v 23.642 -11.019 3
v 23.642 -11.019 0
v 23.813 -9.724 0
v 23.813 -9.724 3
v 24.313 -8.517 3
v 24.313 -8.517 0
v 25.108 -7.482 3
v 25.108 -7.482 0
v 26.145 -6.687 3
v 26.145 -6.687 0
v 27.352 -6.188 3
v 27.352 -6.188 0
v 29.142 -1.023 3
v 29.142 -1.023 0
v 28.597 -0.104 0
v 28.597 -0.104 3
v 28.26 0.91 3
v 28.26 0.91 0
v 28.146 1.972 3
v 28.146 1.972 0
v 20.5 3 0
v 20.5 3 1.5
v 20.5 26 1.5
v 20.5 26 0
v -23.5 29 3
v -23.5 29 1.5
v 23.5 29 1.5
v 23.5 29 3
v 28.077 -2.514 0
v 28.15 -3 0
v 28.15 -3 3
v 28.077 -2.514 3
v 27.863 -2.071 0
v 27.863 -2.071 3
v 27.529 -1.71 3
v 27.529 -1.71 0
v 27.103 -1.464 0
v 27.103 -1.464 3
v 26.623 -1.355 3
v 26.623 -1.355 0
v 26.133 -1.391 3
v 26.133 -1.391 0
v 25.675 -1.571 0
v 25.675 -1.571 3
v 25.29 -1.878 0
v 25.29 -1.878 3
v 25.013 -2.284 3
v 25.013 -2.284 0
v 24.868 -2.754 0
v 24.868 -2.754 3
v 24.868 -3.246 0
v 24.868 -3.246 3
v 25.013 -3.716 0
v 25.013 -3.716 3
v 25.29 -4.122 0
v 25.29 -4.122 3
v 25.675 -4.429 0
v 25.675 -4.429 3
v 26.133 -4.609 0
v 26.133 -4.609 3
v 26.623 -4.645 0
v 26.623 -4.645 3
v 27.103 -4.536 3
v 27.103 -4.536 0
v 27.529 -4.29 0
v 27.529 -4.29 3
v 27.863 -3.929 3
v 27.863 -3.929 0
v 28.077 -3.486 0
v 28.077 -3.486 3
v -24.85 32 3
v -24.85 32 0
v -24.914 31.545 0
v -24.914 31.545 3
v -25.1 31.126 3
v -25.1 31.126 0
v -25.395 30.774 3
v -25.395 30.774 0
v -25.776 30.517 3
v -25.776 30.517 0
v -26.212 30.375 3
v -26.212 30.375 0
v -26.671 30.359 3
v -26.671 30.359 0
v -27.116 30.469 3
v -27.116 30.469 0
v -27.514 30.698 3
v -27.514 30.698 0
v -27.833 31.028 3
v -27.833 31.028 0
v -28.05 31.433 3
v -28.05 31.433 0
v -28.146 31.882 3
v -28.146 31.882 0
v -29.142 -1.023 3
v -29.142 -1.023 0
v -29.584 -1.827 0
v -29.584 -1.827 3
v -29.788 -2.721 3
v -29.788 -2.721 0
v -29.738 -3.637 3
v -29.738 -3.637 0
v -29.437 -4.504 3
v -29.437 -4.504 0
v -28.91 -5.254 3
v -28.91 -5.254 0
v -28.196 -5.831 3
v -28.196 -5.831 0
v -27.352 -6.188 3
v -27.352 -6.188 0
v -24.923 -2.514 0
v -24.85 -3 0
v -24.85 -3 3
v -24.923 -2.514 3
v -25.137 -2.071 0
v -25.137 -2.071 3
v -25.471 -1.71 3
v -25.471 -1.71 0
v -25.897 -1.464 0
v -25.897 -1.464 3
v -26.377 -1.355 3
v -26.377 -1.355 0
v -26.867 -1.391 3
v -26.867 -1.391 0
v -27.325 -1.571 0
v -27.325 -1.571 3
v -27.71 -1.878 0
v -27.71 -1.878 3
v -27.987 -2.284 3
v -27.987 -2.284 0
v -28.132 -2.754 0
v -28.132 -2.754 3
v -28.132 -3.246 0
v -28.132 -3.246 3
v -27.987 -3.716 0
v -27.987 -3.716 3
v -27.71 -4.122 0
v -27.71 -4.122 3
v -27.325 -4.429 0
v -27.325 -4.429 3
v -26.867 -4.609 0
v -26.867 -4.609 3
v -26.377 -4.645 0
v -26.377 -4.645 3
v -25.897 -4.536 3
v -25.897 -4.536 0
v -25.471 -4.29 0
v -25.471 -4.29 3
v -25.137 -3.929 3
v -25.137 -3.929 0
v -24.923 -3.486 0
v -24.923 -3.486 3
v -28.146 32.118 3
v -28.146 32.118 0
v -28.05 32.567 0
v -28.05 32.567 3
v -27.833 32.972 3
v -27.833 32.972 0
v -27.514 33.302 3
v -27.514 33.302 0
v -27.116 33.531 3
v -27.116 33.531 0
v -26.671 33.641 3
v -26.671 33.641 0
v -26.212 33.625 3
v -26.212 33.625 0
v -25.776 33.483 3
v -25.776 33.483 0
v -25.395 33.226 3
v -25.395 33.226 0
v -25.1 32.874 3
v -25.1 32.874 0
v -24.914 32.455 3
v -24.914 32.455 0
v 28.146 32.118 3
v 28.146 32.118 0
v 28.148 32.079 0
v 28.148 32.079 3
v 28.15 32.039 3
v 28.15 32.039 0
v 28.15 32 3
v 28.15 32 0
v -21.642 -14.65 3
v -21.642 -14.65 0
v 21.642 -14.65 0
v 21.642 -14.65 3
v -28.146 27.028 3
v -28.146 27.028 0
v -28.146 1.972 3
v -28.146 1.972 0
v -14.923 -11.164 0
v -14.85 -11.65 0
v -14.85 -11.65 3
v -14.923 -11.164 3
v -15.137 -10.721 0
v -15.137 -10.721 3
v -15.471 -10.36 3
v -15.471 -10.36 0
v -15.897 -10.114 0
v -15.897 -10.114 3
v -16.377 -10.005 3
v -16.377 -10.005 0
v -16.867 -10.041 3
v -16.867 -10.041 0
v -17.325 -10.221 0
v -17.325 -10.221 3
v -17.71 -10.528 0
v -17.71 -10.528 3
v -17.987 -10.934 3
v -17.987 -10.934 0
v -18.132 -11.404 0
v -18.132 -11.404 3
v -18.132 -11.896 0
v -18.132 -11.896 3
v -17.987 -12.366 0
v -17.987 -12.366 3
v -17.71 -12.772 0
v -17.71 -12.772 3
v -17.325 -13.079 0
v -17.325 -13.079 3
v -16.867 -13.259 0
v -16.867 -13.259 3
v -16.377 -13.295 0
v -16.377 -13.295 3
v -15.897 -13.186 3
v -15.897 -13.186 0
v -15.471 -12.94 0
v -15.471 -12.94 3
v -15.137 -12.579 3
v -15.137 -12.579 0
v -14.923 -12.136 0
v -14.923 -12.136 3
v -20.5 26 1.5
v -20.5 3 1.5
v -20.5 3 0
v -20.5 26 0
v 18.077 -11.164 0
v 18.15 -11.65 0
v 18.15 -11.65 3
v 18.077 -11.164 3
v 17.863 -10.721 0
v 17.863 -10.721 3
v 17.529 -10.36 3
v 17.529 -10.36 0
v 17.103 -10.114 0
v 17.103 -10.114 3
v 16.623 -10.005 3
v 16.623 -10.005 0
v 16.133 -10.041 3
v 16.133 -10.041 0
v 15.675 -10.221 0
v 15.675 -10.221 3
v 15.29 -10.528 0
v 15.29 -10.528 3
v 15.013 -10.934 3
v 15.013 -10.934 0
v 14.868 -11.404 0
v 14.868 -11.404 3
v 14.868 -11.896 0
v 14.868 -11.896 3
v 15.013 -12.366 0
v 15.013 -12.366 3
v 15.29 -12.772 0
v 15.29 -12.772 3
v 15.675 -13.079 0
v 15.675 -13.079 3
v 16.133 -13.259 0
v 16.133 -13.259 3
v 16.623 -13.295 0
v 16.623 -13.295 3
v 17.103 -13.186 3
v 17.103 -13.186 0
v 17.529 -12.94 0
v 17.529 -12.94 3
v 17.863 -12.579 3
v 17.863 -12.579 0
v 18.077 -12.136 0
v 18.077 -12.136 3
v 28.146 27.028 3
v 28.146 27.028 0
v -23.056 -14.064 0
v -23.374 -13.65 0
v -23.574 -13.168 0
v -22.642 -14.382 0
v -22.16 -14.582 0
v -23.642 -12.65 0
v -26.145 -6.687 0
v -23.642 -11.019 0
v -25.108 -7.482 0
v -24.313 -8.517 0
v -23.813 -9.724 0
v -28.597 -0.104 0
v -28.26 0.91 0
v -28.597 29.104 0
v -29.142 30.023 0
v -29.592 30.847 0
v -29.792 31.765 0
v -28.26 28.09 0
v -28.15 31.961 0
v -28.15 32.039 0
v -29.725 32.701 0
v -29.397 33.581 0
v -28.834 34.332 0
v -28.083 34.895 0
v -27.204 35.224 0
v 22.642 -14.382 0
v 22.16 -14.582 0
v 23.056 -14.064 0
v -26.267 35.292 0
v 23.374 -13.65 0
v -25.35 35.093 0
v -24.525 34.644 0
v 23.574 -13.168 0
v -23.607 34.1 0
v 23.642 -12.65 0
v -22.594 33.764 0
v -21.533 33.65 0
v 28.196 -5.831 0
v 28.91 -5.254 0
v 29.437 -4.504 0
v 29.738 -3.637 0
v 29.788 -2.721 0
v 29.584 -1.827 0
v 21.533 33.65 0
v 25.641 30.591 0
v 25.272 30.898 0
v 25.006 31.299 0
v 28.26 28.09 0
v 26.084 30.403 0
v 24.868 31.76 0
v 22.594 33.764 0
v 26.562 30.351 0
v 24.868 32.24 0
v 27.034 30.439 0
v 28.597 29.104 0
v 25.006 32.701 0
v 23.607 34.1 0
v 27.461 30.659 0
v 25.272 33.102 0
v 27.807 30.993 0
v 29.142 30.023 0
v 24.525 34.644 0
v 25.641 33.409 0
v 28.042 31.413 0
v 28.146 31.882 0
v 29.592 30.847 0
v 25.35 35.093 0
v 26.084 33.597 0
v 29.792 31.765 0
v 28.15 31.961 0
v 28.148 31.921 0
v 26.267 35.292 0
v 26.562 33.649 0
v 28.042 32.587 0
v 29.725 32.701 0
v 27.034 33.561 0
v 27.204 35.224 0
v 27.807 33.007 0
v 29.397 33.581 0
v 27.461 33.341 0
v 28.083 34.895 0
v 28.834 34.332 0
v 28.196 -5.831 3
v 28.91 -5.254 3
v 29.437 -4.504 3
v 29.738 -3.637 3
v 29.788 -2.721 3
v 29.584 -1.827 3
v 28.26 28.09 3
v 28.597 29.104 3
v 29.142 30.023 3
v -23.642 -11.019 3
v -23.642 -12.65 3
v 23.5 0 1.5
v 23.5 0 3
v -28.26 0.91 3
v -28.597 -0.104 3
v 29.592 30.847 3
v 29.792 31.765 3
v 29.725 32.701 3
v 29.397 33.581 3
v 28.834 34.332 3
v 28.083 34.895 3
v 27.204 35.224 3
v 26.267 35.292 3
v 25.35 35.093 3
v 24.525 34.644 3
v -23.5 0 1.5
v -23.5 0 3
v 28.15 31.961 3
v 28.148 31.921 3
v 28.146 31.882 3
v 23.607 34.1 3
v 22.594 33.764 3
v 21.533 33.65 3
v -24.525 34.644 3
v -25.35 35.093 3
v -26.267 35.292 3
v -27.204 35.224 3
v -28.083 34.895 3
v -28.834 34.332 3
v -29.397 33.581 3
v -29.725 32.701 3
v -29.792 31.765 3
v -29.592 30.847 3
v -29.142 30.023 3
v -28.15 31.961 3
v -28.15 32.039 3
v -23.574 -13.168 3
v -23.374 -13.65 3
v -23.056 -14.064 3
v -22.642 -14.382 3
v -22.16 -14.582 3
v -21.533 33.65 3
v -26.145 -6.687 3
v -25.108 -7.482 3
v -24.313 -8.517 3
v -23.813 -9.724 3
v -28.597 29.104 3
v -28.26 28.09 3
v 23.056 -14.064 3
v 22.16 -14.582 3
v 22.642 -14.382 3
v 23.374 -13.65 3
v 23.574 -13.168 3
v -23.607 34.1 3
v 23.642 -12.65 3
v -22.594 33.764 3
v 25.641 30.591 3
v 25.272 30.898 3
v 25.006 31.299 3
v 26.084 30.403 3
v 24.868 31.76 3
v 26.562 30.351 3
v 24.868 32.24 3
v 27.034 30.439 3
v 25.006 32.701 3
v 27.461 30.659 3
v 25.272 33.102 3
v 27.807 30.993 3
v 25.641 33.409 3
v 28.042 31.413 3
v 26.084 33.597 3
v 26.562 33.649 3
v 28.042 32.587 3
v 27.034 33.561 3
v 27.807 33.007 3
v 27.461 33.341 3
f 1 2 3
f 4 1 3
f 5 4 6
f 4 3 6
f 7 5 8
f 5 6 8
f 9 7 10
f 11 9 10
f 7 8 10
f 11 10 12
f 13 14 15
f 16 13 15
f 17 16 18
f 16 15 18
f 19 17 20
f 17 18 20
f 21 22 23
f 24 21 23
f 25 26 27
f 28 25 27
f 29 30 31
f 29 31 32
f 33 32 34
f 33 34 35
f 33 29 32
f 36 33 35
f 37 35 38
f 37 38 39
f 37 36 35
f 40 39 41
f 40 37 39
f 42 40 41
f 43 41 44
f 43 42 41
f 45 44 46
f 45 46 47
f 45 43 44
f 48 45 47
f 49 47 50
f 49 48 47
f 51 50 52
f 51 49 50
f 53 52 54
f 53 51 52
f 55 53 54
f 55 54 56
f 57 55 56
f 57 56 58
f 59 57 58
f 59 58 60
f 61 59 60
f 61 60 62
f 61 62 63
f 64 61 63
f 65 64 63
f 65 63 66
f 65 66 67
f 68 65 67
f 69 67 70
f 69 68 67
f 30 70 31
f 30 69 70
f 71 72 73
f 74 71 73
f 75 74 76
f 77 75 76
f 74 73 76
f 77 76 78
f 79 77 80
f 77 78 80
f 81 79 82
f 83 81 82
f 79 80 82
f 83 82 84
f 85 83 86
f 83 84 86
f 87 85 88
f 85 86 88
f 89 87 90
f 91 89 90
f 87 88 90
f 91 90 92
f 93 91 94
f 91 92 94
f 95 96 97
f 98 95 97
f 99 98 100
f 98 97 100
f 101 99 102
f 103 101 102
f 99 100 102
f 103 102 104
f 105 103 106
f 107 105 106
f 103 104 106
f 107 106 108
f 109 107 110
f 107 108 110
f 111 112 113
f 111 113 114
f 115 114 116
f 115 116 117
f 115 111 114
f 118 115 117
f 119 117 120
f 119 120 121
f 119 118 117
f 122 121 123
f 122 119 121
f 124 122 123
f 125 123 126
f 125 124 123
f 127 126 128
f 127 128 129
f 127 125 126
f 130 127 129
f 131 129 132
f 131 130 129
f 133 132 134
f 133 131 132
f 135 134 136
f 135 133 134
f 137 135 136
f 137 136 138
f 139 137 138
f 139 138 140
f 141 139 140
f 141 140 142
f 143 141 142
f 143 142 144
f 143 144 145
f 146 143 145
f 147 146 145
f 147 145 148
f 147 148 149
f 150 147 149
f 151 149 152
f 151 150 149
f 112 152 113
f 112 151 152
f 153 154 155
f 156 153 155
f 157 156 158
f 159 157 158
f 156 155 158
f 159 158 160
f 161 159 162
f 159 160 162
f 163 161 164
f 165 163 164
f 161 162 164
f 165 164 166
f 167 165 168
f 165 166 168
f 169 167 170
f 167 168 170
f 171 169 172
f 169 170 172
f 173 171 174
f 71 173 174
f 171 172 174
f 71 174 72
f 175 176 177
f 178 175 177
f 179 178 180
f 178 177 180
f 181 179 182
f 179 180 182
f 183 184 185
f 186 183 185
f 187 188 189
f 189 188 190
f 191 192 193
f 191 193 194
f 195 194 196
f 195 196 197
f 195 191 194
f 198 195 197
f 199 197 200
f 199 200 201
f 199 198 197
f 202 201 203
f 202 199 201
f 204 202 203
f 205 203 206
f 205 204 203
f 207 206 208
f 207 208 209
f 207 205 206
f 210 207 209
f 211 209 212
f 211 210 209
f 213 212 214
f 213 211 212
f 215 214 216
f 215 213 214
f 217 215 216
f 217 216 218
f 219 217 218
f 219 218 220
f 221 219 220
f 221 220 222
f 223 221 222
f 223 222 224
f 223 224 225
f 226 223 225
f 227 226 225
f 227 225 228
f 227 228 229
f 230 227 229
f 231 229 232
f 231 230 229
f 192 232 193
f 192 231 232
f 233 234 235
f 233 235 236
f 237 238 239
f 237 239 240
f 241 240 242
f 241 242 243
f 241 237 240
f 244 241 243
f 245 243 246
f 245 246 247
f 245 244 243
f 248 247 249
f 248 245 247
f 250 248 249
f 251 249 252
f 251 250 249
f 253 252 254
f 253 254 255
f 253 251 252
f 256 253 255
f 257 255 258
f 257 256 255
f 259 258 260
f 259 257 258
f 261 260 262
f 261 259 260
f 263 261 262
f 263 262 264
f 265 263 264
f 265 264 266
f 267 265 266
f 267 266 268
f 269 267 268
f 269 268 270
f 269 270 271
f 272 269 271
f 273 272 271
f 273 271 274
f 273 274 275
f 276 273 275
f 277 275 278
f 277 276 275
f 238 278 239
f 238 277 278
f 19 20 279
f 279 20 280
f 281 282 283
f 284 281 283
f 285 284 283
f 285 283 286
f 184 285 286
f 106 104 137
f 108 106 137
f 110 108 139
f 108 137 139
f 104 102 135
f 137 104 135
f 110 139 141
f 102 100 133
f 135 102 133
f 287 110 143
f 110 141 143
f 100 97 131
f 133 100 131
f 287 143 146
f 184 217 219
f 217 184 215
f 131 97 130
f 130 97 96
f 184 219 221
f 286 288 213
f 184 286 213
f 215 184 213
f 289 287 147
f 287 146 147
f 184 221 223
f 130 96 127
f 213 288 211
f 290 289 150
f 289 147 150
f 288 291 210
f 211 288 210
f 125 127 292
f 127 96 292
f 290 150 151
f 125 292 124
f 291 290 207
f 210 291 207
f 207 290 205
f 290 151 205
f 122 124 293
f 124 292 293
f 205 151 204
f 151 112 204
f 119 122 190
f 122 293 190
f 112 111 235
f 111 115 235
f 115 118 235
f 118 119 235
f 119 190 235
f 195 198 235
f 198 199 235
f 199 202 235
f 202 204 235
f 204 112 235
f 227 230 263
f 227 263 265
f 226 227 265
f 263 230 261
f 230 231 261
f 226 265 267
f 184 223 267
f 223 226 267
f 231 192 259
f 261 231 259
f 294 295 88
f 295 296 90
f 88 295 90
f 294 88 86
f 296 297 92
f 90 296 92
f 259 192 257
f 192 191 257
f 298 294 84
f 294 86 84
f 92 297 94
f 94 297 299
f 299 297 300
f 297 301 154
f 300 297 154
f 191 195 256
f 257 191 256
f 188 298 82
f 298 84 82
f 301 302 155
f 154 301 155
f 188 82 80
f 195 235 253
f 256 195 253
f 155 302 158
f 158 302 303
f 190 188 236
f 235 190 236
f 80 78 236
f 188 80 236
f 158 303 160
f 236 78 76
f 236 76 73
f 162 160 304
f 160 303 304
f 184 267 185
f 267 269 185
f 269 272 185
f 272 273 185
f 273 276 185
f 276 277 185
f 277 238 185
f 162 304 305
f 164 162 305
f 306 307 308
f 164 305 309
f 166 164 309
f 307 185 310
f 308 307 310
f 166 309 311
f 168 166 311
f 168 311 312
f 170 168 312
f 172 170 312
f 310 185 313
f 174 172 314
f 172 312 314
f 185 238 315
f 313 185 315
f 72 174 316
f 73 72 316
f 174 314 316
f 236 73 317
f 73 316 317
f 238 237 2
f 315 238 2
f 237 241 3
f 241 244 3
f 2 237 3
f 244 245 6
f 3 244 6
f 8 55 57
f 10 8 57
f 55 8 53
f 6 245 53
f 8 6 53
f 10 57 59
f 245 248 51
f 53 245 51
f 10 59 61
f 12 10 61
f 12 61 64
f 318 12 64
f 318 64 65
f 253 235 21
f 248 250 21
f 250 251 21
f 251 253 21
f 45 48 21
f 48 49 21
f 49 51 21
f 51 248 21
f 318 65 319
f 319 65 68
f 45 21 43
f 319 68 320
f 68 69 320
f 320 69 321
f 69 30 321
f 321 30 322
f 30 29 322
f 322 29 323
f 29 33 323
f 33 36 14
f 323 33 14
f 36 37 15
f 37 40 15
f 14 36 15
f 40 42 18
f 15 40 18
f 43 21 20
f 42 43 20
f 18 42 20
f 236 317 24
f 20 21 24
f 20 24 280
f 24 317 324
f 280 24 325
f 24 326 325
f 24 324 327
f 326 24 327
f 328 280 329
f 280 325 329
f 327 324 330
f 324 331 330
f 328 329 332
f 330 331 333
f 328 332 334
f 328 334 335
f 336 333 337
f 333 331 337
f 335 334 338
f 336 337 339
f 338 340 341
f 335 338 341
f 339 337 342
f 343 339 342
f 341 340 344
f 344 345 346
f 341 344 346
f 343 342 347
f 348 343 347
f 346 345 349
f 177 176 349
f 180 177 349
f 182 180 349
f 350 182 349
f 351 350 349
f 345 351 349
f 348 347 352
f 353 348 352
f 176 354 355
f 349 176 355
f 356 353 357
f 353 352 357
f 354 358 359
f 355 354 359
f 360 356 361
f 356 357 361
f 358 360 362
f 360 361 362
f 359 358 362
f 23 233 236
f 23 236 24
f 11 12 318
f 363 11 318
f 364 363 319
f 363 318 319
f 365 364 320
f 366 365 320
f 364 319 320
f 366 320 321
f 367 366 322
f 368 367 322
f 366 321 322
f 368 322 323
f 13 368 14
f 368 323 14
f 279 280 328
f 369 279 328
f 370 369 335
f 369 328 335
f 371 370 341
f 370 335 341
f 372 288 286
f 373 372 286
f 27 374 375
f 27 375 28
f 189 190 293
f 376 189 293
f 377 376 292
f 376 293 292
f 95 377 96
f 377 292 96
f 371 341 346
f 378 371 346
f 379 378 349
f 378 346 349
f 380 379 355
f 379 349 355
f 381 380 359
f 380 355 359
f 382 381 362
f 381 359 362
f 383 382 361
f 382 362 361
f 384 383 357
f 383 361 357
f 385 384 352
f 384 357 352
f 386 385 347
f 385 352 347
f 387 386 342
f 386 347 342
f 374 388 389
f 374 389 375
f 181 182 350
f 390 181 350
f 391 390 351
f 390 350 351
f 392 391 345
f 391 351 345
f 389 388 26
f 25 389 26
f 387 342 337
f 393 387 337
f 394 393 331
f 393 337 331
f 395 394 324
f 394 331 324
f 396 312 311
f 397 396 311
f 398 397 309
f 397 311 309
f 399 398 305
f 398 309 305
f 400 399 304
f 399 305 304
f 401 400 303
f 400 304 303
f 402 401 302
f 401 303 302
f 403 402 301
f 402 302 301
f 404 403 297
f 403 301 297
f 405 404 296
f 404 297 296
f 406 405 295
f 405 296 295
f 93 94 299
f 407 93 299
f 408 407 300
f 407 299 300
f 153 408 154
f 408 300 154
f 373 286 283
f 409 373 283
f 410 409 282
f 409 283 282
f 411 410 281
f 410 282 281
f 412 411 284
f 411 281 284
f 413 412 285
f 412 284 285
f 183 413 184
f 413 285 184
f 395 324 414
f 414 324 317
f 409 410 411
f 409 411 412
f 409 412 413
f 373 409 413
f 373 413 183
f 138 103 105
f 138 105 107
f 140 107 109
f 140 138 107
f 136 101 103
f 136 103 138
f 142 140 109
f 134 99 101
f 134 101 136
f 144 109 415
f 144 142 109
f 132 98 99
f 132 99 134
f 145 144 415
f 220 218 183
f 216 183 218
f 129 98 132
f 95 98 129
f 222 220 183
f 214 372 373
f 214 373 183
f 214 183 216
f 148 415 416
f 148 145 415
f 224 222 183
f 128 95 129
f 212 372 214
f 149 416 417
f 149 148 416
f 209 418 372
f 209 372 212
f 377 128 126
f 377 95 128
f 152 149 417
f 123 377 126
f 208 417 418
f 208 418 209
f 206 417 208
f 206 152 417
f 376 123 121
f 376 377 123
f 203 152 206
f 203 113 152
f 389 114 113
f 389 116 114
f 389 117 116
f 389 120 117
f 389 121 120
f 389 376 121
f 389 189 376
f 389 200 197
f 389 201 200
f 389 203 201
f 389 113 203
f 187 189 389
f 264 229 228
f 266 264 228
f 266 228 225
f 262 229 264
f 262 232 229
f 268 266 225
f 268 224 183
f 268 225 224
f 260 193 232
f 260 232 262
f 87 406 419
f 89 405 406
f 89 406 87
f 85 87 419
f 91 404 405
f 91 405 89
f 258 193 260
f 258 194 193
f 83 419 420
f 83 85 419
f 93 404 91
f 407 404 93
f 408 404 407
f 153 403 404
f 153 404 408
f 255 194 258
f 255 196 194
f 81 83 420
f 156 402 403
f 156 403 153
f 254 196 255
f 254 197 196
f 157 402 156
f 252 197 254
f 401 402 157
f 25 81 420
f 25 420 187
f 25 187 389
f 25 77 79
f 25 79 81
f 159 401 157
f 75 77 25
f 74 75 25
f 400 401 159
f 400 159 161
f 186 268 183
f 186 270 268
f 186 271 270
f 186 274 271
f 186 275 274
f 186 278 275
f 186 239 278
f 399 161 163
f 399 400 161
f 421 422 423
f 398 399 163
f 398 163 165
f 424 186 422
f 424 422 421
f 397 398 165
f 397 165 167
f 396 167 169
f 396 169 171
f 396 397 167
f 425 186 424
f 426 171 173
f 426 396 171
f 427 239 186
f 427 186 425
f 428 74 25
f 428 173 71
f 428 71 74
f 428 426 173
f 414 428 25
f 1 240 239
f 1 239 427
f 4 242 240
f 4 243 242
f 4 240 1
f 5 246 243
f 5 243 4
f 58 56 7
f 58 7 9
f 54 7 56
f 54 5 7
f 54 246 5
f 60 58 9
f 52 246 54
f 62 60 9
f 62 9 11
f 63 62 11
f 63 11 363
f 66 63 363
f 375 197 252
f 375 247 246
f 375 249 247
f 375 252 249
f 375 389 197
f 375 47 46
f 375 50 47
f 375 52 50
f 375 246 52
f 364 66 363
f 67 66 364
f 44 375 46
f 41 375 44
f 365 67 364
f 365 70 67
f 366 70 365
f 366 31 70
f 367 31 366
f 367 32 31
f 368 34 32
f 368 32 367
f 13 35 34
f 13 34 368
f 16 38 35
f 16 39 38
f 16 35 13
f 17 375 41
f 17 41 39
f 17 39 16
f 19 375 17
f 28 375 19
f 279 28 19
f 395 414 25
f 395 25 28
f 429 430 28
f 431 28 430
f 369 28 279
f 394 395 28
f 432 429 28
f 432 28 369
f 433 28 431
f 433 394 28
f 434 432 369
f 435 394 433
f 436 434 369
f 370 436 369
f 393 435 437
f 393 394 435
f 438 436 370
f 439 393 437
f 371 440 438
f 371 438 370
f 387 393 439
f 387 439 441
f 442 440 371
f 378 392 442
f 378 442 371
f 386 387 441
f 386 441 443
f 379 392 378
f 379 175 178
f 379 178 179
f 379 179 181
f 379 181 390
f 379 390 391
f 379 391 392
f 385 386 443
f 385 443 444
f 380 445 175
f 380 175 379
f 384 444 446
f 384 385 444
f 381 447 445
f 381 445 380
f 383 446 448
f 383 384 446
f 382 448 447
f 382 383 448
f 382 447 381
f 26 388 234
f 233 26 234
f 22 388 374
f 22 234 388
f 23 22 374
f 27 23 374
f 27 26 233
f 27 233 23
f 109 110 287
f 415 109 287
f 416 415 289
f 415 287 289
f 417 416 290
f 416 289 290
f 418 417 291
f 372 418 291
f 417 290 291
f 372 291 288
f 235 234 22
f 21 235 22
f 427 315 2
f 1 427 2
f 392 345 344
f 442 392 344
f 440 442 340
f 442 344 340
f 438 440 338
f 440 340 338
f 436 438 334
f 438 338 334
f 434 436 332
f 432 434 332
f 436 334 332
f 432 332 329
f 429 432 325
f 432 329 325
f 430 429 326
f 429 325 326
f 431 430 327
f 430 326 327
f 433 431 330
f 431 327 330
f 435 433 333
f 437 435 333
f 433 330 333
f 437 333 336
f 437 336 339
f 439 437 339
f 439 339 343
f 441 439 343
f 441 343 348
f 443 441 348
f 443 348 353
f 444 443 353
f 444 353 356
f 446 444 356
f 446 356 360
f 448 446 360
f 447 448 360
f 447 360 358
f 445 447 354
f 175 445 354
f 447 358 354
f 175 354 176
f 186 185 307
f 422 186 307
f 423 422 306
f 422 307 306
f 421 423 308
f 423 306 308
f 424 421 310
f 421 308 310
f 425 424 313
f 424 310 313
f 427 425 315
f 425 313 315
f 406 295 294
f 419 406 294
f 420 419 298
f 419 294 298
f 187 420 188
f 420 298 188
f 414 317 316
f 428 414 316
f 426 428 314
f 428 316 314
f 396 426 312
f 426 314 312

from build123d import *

# Parameters (mm, degrees)
F0_W          = 47
F0_H          = 29
F1_DEPTH      = 1.5
F0_R          = 1.65
F2_DEPTH      = 3
F3_W          = 41
F3_H          = 23
F4_DEPTH      = 1.5
F4_DEPTH_BACK = 25


with BuildPart() as f1:
    # F0 (on Top) → F1 (new body)
    with BuildSketch(Plane.XY):
        with Locations((0, 14.5)):
            Rectangle(F0_W, F0_H)
    extrude(amount=F1_DEPTH)

    # F0 (on Top) → F2 (join)
    with BuildSketch(Plane.XY):
        with BuildLine():
            ThreePointArc((-21.533361, 33.65), (-23.10973, 33.904996), (-24.525312, 34.643976))
            ThreePointArc((-24.525312, 34.643976), (-28.834444, 34.33246), (-29.142296, 30.023065))
            ThreePointArc((-29.142296, 30.023065), (-28.401441, 28.606095), (-28.145774, 27.027708))
            Line((-28.145774, 27.027708), (-28.145774, 1.972292))
            ThreePointArc((-28.145774, 1.972292), (-28.401441, 0.393905), (-29.142296, -1.023065))
            ThreePointArc((-29.142296, -1.023065), (-29.617954, -4.080909), (-27.351685, -6.188202))
            ThreePointArc((-27.351685, -6.188202), (-24.676504, -7.9735), (-23.642116, -11.018812))
            Line((-23.642116, -11.018812), (-23.642116, -12.65))
            ThreePointArc((-23.642116, -12.65), (-23.05633, -14.064214), (-21.642116, -14.65))
            Line((-21.642116, -14.65), (21.642116, -14.65))
            ThreePointArc((21.642116, -14.65), (23.05633, -14.064214), (23.642116, -12.65))
            Line((23.642116, -12.65), (23.642116, -11.018812))
            ThreePointArc((23.642116, -11.018812), (24.676504, -7.9735), (27.351685, -6.188202))
            ThreePointArc((27.351685, -6.188202), (29.617954, -4.080909), (29.142296, -1.023065))
            ThreePointArc((29.142296, -1.023065), (28.401441, 0.393905), (28.145774, 1.972292))
            Line((28.145774, 1.972292), (28.145774, 27.027708))
            ThreePointArc((28.145774, 27.027708), (28.401441, 28.606095), (29.142296, 30.023065))
            ThreePointArc((29.142296, 30.023065), (28.834444, 34.33246), (24.525312, 34.643976))
            ThreePointArc((24.525312, 34.643976), (23.10973, 33.904996), (21.533361, 33.65))
            Line((21.533361, 33.65), (-21.533361, 33.65))
        make_face()
        with Locations((-16.5, -11.65)):
            Circle(F0_R, mode=Mode.SUBTRACT)
        with Locations((-26.5, -3)):
            Circle(F0_R, mode=Mode.SUBTRACT)
        with Locations((16.5, -11.65)):
            Circle(F0_R, mode=Mode.SUBTRACT)
        with Locations((26.5, -3)):
            Circle(F0_R, mode=Mode.SUBTRACT)
        with BuildLine():
            ThreePointArc((-28.145774, 32.118016), (-26.440954, 33.648943), (-24.85, 32))
            ThreePointArc((-24.85, 32), (-26.440954, 30.351057), (-28.145774, 31.881984))
            ThreePointArc((-28.145774, 31.881984), (-28.15, 32), (-28.145774, 32.118016))
        make_face(mode=Mode.SUBTRACT)
        with Locations((0, 14.5)):
            Rectangle(F0_W, F0_H, mode=Mode.SUBTRACT)
        with BuildLine():
            ThreePointArc((28.145774, 32.118016), (28.148943, 32.059046), (28.15, 32))
            ThreePointArc((28.15, 32), (28.148943, 31.940954), (28.145774, 31.881984))
            ThreePointArc((28.145774, 31.881984), (24.85, 32), (28.145774, 32.118016))
        make_face(mode=Mode.SUBTRACT)
    extrude(amount=F2_DEPTH)

    # F3 (on face) → F4 (cut, two sides)
    with BuildSketch(Plane.XY.offset(1.5)) as f4_sk:
        with Locations((0, 14.5)):
            Rectangle(F3_W, F3_H)
    extrude(amount=-F4_DEPTH, mode=Mode.SUBTRACT)
    extrude(f4_sk.sketch, amount=-F4_DEPTH_BACK, mode=Mode.SUBTRACT)


solid = f1.part
